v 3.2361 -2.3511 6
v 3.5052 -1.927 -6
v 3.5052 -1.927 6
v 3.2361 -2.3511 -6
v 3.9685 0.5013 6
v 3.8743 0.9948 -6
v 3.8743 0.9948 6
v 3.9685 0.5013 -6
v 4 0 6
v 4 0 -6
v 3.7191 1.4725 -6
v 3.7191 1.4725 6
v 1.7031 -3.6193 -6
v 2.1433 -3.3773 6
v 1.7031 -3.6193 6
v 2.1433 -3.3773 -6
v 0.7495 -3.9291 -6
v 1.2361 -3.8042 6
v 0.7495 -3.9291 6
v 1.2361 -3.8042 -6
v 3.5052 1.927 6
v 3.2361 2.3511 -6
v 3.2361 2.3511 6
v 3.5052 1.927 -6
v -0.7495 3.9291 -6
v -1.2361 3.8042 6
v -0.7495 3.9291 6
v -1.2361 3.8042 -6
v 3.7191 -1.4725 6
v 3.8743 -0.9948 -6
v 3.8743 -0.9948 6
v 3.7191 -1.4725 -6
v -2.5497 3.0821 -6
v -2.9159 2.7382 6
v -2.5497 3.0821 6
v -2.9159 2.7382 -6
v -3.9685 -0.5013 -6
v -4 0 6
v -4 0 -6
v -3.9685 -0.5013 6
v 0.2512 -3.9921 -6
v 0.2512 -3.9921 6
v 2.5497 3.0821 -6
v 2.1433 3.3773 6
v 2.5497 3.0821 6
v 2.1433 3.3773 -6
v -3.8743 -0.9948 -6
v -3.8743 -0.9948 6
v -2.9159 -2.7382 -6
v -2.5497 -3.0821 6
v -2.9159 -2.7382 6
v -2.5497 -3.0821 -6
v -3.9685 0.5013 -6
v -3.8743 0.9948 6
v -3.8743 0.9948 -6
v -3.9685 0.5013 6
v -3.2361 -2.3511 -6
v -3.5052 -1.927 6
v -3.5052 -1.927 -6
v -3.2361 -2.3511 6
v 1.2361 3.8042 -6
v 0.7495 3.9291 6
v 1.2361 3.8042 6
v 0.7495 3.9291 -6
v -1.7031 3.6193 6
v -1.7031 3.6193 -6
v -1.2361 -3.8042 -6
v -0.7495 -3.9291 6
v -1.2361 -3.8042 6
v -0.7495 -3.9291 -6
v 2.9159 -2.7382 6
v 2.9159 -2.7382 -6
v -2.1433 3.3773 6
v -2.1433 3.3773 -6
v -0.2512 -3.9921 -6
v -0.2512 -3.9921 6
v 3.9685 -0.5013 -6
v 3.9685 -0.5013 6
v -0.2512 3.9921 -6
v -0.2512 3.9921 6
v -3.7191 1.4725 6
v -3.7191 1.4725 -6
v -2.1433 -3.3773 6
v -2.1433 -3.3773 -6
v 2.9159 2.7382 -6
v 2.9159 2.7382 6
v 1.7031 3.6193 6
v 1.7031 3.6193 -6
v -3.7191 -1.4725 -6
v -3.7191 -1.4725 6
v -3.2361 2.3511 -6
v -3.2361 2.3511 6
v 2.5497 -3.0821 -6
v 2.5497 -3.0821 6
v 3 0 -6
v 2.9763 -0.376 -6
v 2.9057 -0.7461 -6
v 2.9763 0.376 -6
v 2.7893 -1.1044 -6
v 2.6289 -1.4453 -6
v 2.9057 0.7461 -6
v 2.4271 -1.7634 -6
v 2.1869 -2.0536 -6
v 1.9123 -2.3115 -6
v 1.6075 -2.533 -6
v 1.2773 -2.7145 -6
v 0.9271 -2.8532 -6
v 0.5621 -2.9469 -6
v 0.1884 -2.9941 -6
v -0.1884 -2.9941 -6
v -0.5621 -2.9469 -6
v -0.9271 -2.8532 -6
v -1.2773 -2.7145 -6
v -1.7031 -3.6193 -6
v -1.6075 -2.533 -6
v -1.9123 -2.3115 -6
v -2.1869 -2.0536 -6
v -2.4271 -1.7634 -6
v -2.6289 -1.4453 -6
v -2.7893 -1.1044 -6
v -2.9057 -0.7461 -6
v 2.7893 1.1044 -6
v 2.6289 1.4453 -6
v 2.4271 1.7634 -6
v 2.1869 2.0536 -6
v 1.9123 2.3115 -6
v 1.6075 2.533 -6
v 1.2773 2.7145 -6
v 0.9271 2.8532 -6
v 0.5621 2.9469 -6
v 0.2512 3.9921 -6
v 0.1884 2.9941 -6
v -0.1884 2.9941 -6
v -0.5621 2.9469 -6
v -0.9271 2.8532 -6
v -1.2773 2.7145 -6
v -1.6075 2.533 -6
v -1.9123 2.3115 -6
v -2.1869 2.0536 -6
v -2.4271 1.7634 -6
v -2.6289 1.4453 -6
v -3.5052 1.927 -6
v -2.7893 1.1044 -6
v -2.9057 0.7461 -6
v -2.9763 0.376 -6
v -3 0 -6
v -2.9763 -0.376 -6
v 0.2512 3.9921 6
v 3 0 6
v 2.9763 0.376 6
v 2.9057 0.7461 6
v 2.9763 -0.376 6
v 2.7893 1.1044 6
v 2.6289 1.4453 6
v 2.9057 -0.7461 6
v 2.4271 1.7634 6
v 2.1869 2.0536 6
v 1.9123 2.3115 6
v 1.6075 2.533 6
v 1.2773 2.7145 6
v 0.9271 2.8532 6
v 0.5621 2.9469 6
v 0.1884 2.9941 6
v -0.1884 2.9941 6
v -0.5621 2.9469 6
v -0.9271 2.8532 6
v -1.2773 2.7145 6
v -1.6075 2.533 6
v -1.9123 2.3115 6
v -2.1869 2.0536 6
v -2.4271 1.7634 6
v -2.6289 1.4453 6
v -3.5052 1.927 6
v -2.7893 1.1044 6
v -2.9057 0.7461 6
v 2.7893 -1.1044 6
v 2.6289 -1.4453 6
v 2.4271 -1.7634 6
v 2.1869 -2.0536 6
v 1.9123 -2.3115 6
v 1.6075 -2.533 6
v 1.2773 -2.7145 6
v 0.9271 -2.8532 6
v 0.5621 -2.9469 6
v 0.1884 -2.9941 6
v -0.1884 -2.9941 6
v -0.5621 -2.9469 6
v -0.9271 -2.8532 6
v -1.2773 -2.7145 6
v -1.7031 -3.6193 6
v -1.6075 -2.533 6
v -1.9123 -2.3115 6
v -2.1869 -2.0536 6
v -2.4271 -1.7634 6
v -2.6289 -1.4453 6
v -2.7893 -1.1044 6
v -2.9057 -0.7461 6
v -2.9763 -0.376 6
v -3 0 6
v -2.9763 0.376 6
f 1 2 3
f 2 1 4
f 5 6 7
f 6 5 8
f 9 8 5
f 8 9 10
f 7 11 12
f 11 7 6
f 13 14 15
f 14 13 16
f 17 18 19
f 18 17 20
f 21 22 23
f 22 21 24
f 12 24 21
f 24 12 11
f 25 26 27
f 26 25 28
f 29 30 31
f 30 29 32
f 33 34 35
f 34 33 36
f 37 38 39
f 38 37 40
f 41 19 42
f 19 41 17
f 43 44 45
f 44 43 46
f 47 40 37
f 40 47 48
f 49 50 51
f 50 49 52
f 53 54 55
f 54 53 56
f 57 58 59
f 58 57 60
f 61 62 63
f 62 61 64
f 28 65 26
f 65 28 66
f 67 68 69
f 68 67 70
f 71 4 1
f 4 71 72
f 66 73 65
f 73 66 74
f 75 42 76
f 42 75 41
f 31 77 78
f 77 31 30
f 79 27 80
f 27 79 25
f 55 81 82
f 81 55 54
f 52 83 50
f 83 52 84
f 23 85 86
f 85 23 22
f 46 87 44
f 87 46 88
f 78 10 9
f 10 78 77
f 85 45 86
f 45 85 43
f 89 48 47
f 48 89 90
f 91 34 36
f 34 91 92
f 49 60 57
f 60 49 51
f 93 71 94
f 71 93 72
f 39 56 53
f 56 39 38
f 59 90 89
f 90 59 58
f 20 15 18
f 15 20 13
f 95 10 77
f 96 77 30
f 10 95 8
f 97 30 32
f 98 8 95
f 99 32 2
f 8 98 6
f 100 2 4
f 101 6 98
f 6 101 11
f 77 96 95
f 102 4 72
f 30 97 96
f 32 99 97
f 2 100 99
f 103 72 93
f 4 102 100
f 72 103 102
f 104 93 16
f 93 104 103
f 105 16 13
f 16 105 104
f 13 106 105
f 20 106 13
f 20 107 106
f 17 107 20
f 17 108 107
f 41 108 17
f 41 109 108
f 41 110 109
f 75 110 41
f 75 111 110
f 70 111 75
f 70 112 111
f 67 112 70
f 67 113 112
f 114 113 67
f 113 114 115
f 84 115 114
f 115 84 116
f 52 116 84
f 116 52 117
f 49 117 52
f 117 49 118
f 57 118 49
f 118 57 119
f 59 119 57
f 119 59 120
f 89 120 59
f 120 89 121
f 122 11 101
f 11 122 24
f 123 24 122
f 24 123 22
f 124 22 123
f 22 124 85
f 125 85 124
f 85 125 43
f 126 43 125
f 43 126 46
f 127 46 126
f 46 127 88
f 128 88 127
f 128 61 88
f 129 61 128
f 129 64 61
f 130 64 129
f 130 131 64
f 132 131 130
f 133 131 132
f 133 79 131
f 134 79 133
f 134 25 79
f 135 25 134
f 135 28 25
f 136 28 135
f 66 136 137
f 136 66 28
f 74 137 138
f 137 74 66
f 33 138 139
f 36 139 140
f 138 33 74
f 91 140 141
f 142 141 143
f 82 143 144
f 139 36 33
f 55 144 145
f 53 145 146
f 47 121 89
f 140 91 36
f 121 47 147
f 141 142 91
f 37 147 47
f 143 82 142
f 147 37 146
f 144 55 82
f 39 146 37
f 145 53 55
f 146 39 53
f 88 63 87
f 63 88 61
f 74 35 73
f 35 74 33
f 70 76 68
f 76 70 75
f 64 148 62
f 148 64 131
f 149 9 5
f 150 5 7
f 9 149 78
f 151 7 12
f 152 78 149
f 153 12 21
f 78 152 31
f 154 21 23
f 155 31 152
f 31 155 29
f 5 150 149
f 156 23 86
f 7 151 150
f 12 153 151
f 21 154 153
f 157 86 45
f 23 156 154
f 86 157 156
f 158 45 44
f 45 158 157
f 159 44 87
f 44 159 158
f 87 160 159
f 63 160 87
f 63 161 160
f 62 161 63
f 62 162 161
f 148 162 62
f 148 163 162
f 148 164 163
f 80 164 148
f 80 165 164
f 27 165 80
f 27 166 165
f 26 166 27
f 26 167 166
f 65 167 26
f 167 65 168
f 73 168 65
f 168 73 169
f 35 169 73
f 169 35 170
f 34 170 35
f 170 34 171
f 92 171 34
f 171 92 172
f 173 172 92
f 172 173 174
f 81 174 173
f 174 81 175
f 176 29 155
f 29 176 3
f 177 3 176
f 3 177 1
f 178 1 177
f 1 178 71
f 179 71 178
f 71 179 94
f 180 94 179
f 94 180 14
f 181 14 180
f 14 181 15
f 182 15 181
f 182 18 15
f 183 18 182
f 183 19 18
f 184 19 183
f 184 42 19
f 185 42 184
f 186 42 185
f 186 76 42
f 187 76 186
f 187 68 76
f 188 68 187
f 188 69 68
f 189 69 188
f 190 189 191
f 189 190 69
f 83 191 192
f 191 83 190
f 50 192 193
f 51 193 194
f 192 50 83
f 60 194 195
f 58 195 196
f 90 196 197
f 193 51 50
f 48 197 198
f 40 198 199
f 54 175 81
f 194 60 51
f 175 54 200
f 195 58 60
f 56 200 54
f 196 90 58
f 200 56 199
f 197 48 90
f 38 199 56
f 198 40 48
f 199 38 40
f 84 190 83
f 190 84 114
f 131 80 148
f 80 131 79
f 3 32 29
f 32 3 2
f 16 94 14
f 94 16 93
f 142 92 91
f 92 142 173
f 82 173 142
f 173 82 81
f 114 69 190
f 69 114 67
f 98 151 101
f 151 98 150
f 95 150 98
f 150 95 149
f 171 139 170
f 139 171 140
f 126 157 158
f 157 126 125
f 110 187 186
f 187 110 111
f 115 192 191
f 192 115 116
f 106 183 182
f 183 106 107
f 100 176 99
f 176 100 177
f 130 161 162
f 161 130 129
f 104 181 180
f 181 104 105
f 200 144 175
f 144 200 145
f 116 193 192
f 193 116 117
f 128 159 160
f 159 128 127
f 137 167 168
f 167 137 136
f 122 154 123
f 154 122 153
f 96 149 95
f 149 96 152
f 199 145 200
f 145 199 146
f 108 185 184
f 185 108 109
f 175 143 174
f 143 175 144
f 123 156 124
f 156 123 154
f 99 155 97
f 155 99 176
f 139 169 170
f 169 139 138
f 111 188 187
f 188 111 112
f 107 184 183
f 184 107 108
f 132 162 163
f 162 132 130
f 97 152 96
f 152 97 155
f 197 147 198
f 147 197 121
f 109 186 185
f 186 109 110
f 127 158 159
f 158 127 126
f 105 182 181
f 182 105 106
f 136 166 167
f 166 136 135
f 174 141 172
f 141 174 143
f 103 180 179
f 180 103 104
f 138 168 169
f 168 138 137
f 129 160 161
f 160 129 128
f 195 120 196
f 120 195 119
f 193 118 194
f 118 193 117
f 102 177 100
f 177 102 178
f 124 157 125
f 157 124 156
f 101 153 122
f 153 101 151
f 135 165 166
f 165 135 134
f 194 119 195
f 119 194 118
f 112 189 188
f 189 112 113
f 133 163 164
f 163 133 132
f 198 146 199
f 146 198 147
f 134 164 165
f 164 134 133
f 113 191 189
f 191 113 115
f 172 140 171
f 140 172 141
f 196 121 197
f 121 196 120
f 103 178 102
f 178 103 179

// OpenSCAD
$fn = 50;


difference() {
	union() {
		translate(v = [0, 0, -6.0000000000]) {
			cylinder(h = 12, r = 4.0000000000);
		}
	}
	union() {
		translate(v = [0, 0, -100.0000000000]) {
			cylinder(h = 200, r = 3.0000000000);
		}
	}
}
